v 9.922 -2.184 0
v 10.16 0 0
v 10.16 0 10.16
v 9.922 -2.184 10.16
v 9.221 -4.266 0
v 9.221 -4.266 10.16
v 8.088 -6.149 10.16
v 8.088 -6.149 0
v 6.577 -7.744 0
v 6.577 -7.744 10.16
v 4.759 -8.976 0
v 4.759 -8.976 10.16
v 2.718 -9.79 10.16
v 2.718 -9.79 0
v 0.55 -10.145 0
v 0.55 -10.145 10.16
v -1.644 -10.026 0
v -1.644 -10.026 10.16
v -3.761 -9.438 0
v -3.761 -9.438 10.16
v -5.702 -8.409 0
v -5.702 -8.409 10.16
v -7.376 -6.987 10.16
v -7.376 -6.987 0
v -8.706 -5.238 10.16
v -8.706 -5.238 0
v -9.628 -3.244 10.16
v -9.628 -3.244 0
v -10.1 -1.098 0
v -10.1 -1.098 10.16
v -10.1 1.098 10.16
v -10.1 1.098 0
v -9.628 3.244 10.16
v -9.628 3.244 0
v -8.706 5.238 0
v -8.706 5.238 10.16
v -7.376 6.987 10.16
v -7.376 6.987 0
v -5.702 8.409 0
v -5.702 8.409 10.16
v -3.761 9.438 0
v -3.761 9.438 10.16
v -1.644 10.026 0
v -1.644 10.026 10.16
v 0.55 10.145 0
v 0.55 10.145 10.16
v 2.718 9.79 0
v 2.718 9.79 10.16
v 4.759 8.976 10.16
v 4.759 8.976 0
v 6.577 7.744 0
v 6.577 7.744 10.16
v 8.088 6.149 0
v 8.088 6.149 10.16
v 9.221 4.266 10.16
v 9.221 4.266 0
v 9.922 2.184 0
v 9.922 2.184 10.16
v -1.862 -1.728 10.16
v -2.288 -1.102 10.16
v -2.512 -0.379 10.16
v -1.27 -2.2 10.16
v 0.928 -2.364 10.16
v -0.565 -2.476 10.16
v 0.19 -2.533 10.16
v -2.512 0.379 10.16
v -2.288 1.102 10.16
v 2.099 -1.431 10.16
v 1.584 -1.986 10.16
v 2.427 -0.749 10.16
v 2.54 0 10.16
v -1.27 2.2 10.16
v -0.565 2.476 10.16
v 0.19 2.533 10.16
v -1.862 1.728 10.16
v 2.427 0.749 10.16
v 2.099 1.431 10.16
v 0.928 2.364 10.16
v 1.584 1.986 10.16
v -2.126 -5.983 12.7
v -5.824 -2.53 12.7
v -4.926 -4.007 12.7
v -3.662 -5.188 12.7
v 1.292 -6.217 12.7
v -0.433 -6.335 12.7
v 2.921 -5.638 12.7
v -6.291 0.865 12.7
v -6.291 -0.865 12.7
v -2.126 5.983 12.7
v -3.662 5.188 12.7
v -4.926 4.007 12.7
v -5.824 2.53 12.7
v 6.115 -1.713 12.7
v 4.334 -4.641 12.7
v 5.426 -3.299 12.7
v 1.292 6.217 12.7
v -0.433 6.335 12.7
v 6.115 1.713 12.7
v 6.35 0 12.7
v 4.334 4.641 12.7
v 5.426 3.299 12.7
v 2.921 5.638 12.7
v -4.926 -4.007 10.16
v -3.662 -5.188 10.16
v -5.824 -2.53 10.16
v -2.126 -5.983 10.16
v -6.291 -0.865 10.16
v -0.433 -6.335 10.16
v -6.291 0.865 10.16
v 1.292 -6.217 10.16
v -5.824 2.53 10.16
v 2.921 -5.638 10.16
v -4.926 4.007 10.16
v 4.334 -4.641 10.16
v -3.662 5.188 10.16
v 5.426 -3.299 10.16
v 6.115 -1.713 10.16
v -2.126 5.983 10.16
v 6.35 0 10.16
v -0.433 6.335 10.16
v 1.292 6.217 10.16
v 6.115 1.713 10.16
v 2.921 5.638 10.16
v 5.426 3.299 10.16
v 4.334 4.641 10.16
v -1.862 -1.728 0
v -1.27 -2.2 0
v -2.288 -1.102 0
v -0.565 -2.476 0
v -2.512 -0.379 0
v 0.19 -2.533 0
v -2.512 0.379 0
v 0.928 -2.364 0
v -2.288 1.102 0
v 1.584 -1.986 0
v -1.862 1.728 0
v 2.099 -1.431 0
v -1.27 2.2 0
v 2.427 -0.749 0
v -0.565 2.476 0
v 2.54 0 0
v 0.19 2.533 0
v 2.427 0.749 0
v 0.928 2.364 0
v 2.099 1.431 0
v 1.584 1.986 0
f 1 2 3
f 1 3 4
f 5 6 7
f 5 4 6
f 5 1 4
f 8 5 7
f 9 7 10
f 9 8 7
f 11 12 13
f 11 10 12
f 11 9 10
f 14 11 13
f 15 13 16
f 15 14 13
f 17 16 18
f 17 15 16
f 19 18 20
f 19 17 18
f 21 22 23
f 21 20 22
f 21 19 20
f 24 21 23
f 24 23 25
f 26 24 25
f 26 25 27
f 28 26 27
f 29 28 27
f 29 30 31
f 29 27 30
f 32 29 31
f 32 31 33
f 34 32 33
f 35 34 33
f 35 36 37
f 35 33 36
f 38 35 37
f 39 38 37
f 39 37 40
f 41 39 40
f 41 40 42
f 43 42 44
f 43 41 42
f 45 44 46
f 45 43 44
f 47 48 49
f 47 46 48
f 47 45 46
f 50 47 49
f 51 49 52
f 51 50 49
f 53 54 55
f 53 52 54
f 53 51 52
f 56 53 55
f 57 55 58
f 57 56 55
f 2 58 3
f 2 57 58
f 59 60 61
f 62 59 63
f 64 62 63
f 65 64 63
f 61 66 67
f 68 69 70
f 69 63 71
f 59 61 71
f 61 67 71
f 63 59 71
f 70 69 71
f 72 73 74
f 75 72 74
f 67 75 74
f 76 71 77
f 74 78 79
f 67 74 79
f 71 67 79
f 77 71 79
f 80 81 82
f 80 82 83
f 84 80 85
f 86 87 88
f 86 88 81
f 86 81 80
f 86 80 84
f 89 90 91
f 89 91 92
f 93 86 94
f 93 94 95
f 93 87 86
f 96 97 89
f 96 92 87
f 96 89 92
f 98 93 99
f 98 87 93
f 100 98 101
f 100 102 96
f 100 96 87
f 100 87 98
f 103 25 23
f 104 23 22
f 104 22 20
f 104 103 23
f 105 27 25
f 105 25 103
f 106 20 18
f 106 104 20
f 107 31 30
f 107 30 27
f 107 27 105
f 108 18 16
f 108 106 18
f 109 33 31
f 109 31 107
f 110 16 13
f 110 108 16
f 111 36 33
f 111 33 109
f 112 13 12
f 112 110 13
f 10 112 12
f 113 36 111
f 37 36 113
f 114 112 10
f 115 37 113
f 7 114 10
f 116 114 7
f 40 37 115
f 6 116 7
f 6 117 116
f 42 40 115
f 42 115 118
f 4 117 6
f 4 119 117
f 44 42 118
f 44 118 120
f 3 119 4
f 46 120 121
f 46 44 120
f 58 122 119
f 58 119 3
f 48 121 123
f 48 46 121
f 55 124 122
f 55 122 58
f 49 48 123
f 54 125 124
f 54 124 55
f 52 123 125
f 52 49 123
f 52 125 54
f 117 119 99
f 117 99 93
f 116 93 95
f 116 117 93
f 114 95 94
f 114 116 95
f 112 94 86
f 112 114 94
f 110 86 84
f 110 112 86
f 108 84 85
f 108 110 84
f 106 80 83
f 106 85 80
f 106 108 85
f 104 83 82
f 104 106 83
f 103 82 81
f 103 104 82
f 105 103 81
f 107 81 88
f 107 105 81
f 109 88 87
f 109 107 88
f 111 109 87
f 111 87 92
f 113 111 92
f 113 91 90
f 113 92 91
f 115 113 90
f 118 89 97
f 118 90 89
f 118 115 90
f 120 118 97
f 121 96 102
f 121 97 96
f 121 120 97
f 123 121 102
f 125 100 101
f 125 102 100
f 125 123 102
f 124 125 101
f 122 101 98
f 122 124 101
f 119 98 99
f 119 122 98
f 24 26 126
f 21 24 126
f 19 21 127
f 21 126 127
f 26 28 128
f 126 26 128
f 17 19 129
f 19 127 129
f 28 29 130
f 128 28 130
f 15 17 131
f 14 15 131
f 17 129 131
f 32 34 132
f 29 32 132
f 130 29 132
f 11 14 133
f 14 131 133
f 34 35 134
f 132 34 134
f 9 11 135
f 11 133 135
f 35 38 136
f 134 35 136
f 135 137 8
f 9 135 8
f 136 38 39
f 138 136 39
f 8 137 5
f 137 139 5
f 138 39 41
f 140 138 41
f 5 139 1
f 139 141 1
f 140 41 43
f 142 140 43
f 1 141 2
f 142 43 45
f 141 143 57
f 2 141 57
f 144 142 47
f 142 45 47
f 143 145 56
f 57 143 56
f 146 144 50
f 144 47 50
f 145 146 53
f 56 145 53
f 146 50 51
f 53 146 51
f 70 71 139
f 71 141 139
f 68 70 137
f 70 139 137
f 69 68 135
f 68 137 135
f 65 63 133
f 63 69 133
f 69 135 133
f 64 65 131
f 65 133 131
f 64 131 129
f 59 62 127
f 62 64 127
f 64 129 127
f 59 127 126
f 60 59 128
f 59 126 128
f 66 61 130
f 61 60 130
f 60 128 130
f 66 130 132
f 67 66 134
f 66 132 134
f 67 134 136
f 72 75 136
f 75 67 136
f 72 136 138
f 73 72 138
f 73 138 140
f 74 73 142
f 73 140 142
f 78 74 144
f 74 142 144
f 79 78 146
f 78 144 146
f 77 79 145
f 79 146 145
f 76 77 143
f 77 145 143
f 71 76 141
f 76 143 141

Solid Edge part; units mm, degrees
sketch "Sketch1" plane through (0, 0, 0) normal (0, 0, 1) x (1, 0, 0)
  circle A0 centre (0, 0) radius 10.16
  circle A1 centre (0, 0) radius 2.54
extrude "Protrusion1" add sketch "Sketch1" along normal blind 10.16
sketch "Sketch2" plane through (0, 0, 10.16) normal (0, 0, 1) x (1, 0, 0)
  circle A0 centre (0, 0) radius 6.35
extrude "ExtrudedProtrusion_3" add sketch "Sketch2" along normal blind 2.54
